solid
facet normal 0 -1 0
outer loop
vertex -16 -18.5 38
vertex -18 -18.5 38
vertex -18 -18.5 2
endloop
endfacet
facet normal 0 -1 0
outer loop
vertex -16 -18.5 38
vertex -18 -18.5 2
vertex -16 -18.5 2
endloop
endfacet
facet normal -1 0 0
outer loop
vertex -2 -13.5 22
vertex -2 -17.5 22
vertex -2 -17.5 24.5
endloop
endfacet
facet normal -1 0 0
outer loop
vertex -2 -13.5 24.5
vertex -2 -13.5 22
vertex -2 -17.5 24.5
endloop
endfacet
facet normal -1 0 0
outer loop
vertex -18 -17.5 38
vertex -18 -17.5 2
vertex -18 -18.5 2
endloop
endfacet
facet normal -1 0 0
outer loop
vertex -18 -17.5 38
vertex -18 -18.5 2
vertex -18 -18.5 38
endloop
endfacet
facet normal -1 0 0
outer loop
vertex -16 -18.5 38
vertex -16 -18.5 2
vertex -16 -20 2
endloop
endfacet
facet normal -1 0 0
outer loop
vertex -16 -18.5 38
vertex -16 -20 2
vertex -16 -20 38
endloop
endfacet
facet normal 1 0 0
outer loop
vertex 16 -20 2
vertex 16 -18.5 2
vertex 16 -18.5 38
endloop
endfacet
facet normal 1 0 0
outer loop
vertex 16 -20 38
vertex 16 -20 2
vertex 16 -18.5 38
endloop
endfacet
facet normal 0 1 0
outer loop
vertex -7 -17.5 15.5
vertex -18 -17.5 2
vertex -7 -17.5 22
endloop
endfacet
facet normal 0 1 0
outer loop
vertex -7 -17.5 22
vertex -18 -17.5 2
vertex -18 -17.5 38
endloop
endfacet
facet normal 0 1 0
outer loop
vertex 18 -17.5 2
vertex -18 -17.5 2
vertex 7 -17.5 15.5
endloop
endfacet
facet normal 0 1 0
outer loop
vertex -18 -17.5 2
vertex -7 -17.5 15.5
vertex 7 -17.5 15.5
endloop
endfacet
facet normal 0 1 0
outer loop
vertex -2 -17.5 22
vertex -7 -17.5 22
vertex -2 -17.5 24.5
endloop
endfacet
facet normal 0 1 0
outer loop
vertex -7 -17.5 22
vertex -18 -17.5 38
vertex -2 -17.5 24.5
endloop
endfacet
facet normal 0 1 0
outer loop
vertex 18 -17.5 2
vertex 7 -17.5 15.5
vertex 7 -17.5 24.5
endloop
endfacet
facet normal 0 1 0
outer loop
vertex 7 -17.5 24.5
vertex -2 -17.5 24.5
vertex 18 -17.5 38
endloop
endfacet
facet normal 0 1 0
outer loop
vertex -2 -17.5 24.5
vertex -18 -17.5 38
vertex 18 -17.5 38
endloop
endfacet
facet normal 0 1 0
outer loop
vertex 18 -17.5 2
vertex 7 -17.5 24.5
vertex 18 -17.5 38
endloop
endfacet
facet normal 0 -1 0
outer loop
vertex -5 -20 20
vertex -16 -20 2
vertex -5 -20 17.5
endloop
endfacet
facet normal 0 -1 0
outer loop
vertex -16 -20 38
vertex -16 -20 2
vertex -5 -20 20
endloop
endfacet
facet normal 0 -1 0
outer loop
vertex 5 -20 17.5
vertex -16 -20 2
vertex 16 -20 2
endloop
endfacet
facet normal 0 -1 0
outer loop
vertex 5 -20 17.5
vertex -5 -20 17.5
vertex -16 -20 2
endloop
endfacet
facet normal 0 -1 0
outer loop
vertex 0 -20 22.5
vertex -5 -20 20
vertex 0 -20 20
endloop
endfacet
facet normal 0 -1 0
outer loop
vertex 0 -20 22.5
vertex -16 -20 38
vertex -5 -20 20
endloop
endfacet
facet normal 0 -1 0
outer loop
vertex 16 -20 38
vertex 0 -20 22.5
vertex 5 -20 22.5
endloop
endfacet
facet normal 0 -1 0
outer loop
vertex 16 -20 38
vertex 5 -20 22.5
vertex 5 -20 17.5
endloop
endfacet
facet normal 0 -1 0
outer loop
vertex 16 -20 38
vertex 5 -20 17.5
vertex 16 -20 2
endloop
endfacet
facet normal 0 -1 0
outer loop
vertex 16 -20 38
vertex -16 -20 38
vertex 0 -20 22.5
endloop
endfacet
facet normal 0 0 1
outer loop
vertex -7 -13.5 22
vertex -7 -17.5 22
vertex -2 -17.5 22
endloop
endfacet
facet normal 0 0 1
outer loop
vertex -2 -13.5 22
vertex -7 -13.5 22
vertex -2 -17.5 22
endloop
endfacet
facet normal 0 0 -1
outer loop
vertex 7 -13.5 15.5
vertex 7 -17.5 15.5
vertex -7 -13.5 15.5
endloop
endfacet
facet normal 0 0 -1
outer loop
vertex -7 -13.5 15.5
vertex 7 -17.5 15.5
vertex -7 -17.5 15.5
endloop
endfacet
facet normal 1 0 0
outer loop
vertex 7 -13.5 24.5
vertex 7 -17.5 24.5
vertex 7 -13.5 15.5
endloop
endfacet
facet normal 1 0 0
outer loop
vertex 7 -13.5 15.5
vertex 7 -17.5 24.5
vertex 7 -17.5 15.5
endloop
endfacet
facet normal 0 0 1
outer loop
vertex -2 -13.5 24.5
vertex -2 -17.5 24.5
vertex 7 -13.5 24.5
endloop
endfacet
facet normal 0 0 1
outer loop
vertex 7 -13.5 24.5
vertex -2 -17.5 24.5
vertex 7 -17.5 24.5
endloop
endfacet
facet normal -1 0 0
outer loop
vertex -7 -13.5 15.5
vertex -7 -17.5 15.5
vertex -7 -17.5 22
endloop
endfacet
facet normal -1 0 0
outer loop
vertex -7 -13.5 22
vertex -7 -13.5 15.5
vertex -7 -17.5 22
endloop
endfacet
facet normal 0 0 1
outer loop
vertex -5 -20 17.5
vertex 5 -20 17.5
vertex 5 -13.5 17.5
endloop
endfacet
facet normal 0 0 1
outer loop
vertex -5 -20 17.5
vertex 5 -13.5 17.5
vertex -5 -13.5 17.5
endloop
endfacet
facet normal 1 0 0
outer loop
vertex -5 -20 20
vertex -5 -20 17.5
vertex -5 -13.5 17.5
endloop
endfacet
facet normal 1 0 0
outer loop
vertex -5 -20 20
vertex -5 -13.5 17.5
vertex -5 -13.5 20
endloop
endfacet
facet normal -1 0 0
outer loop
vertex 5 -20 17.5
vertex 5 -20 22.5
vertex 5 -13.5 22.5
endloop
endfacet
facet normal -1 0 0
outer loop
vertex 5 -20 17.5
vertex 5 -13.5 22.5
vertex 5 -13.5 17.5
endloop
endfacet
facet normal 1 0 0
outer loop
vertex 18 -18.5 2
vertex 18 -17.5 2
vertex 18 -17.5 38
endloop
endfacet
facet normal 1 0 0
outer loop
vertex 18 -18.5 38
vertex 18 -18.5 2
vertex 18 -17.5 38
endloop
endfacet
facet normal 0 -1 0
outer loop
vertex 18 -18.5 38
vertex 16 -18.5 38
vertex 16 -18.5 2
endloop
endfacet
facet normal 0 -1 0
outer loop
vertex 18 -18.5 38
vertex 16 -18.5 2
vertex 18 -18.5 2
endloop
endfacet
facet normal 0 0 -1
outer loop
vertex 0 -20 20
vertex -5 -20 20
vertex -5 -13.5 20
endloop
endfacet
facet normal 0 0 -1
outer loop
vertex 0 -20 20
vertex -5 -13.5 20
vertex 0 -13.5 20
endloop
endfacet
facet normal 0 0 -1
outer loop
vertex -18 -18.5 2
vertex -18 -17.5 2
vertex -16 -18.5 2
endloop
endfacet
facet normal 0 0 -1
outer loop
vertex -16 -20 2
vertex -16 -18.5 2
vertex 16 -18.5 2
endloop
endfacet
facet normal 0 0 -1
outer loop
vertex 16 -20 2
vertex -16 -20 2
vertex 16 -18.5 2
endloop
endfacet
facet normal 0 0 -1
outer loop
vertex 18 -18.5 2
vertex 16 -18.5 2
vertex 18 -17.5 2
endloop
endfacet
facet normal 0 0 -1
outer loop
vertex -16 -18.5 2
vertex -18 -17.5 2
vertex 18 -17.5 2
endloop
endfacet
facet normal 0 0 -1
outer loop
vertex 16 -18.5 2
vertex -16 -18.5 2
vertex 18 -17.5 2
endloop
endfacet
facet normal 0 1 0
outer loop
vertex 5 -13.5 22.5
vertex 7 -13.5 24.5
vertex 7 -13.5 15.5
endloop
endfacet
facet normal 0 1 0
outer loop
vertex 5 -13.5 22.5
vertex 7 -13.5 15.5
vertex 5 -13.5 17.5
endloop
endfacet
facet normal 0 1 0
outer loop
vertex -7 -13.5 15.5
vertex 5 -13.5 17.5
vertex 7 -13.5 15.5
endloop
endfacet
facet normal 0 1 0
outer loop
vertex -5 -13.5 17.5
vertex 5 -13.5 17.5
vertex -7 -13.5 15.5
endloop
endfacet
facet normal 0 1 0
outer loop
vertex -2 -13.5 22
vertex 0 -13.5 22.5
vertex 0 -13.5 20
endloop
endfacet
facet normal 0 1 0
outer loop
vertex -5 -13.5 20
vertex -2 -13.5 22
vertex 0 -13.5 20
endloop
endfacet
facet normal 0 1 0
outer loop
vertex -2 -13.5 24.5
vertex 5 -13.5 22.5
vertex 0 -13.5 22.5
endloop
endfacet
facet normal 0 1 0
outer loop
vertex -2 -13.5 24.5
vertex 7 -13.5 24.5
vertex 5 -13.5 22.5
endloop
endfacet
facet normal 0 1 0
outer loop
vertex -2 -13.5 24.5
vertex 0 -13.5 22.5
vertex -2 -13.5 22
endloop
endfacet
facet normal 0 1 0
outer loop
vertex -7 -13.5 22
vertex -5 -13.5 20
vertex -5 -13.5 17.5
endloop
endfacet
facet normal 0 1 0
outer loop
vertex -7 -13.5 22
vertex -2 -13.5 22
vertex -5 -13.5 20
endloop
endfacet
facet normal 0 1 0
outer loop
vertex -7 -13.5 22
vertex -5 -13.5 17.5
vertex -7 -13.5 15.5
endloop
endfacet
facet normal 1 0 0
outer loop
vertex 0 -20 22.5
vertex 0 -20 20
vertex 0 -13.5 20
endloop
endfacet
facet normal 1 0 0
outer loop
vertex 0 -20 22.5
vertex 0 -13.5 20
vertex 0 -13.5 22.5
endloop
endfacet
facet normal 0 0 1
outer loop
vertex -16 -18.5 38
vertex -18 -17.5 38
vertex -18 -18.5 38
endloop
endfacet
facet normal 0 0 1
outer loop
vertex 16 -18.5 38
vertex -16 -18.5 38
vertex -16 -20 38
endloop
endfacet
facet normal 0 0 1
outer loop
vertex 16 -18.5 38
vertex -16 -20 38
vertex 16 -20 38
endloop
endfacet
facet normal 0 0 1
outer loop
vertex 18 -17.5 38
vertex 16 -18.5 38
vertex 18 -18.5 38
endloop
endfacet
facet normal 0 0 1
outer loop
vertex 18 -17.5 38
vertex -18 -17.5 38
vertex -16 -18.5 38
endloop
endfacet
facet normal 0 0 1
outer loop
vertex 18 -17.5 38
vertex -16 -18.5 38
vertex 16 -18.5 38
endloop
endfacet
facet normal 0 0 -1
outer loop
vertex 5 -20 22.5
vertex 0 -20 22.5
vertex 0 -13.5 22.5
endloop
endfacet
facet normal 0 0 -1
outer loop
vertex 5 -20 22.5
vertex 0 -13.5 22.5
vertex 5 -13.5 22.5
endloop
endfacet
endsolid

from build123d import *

# Parameters (mm, degrees)
SKETCH021_W                    = 32
SKETCH021_H                    = 36
EXTRUDE019_DEPTH               = 1.5
SKETCH020_W                    = 36
SKETCH020_H                    = 36
EXTRUDE018_DEPTH               = 1
FUSION011_PLACEMENT_ANGLE      = 90
BASEFEATURE002_PLACEMENT_ANGLE = 90
POCKET002_DEPTH                = 5
PAD_DEPTH                      = 6.5
POCKET007_DEPTH                = 6.5
BODY003_PLACEMENT_ANGLE        = 90


with BuildPart() as extrude019:
    # Sketch021 (on Face6 of Extrude018) → Extrude019 (new body)
    with BuildSketch(Plane.XY.offset(1)):
        Rectangle(SKETCH021_W, SKETCH021_H)
    extrude(amount=EXTRUDE019_DEPTH)


with BuildPart() as body003:
    # Sketch020 → Extrude018 (new body)
    with BuildSketch(Plane.XY):
        Rectangle(SKETCH020_W, SKETCH020_H)
    extrude(amount=EXTRUDE018_DEPTH)

    # Fusion011: union Extrude019
    add(extrude019.part)


with BuildPart() as body003_1:
    # Fusion011 placement: moved
    add(body003.part.moved(Location((0, -17.5, 20))).rotate(Axis((0, -17.5, 20), (1, 0, 0)), FUSION011_PLACEMENT_ANGLE))


with BuildPart() as body003_2:
    # BaseFeature002 placement: moved
    add(body003_1.part.moved(Location((0, -20, -17.5))).rotate(Axis((0, -20, -17.5), (-1, 0, 0)), BASEFEATURE002_PLACEMENT_ANGLE))

    # Sketch026 (on Face8 of BaseFeature002) → Pocket002 (cut)
    with BuildSketch(Plane.XY.offset(2.5)):
        Polygon((0, 0), (0, 2.5), (5, 2.5), (5, -2.5), (-5, -2.5), (-5, 0), align=None)
    extrude(amount=-POCKET002_DEPTH, mode=Mode.SUBTRACT)

    # Sketch046 (on Face8 of Pocket002) → Pad (join)
    with BuildSketch(Plane.XY.offset(2.5)):
        Polygon((-2, 4.5), (7, 4.5), (7, -4.5), (-7, -4.5), (-7, 2), (-2, 2), align=None)
    extrude(amount=-PAD_DEPTH)

    # Sketch026 (on Face8 of BaseFeature002) → Pocket007 (cut)
    with BuildSketch(Plane.XY.offset(2.5)):
        Polygon((0, 0), (0, 2.5), (5, 2.5), (5, -2.5), (-5, -2.5), (-5, 0), align=None)
    extrude(amount=-POCKET007_DEPTH, mode=Mode.SUBTRACT)


with BuildPart() as body003_3:
    # Body003 placement: moved
    add(body003_2.part.moved(Location((0, -17.5, 20))).rotate(Axis((0, -17.5, 20), (1, 0, 0)), BODY003_PLACEMENT_ANGLE))


solid = body003_3.part
